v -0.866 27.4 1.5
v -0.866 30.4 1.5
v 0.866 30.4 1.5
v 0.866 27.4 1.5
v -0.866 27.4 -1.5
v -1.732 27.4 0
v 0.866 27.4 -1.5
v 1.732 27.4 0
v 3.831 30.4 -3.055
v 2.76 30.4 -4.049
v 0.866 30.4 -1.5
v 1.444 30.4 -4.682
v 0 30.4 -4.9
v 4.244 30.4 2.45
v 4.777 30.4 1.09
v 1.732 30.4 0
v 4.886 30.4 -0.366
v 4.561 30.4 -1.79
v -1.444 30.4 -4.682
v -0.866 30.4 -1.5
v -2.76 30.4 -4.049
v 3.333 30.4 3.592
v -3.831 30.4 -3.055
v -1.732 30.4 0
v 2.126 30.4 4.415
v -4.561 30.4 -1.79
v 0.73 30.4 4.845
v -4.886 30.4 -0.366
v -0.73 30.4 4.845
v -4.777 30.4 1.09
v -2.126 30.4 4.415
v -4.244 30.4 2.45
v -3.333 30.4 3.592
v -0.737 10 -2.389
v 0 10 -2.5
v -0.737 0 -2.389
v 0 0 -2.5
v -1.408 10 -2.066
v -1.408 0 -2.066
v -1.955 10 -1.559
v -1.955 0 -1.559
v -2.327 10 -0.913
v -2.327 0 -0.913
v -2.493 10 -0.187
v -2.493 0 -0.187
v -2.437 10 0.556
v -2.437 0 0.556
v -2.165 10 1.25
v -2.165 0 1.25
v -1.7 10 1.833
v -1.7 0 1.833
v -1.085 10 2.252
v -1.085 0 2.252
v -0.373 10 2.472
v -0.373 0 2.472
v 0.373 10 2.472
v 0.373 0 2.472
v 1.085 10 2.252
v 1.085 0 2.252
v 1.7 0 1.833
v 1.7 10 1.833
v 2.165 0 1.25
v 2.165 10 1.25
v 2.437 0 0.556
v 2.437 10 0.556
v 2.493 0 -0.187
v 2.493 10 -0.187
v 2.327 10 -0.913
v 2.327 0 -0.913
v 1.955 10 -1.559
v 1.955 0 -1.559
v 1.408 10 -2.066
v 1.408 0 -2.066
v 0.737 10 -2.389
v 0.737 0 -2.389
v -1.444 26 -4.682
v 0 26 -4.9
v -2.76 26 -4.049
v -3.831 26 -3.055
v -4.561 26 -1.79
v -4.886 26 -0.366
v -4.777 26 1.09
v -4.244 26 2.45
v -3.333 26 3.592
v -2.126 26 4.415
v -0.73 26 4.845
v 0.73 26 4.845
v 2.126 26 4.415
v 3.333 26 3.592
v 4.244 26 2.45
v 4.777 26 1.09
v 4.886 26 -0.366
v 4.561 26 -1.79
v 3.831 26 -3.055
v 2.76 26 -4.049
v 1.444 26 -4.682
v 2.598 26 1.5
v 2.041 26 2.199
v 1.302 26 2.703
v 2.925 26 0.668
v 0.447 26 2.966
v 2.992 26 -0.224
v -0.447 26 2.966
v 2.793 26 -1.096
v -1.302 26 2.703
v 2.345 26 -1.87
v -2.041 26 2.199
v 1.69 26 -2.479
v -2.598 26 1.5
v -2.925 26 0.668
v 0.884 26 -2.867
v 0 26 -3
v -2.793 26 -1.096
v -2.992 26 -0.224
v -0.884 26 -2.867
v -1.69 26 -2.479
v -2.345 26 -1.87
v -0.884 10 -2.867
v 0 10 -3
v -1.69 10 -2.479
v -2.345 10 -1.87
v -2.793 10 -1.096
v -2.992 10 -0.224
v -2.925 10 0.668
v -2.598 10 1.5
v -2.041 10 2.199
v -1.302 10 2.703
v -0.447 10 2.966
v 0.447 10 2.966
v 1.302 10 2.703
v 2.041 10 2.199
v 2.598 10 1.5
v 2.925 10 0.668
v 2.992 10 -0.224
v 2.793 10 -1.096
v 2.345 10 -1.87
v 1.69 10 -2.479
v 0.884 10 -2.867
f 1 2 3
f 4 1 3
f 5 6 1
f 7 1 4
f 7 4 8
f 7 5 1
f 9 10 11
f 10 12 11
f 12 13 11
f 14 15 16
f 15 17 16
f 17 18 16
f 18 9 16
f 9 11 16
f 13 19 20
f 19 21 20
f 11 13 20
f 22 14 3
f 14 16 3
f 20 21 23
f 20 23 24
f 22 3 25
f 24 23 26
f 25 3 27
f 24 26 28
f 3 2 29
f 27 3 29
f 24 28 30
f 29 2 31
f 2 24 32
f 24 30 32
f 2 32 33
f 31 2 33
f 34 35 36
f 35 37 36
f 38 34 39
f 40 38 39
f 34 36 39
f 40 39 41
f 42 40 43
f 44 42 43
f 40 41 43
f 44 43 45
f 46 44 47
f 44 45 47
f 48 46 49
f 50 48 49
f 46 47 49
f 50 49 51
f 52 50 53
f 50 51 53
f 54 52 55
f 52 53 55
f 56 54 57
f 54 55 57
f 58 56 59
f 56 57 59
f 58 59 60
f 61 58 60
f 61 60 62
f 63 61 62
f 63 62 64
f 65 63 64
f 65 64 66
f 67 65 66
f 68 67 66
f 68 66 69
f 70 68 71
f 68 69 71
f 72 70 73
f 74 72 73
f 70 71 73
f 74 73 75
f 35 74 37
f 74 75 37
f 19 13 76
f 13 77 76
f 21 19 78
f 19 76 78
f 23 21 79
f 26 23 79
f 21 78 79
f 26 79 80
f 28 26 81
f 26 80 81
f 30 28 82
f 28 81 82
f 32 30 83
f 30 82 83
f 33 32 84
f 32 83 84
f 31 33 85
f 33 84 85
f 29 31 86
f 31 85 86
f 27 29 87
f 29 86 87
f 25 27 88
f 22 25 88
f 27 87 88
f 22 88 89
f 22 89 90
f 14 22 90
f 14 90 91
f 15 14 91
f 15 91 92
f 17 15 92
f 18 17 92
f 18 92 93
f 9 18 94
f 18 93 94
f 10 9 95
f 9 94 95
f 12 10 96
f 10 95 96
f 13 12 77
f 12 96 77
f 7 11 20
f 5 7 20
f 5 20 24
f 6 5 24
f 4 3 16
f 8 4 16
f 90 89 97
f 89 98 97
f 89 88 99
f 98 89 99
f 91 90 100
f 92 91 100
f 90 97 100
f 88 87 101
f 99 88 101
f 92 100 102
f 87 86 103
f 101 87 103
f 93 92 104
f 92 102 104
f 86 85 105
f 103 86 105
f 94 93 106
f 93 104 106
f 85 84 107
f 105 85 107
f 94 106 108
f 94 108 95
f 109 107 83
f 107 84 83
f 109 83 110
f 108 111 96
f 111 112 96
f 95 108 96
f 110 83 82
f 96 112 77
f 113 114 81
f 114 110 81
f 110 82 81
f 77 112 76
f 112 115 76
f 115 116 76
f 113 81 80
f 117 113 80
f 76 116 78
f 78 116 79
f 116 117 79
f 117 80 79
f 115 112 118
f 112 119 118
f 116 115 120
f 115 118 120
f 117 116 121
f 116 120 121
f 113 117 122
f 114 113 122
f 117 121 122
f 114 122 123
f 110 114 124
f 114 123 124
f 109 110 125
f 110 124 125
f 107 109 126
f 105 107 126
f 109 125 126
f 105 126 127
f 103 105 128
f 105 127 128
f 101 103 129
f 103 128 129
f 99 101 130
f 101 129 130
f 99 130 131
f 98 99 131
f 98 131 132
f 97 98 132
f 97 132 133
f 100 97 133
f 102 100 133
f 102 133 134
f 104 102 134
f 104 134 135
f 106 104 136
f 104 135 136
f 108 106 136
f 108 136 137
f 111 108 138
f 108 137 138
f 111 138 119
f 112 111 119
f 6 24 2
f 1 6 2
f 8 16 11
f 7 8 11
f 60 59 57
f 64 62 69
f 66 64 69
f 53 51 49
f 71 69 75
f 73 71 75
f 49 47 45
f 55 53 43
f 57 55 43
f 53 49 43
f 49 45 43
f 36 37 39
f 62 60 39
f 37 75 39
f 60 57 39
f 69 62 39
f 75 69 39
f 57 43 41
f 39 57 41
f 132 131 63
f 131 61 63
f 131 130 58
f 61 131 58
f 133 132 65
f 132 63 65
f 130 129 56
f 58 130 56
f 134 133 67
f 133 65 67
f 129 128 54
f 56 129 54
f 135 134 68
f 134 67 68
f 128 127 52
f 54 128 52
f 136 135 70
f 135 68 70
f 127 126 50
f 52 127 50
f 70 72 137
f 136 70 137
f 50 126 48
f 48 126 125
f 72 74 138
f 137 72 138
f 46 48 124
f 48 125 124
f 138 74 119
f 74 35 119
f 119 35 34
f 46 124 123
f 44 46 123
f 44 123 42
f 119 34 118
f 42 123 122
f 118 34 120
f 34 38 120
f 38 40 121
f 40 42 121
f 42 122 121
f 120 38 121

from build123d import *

# Parameters (mm, degrees)
CUT_EXTRUDE_1_DEPTH = 3


with BuildPart() as part:
    # 草图1 → 旋转1 (revolve)
    with BuildSketch(Plane.XY, mode=Mode.PRIVATE) as revolve_1_sk:
        Polygon((0, 0), (0, 30.4), (4.9, 30.4), (4.9, 26), (3, 26), (3, 10), (2.5, 10), (2.5, 0), align=None)
    revolve(revolve_1_sk.sketch.rotate(Axis((0, 0, 0), (0, 1, 0)), 90), axis=Axis((0, 0, 0), (0, 1, 0)))

    # 草图2 → 切除-拉伸1 (cut)
    with BuildSketch(Plane(origin=(0, 30.4, 0), x_dir=(1, 0, 0), z_dir=(0, 1, 0))):
        Polygon((1.732050808, 0), (0.866025404, 1.5), (-0.866025404, 1.5), (-1.732050808, 0), (-0.866025404, -1.5), (0.866025404, -1.5), align=None)
    extrude(amount=-CUT_EXTRUDE_1_DEPTH, mode=Mode.SUBTRACT)


solid = part.part
